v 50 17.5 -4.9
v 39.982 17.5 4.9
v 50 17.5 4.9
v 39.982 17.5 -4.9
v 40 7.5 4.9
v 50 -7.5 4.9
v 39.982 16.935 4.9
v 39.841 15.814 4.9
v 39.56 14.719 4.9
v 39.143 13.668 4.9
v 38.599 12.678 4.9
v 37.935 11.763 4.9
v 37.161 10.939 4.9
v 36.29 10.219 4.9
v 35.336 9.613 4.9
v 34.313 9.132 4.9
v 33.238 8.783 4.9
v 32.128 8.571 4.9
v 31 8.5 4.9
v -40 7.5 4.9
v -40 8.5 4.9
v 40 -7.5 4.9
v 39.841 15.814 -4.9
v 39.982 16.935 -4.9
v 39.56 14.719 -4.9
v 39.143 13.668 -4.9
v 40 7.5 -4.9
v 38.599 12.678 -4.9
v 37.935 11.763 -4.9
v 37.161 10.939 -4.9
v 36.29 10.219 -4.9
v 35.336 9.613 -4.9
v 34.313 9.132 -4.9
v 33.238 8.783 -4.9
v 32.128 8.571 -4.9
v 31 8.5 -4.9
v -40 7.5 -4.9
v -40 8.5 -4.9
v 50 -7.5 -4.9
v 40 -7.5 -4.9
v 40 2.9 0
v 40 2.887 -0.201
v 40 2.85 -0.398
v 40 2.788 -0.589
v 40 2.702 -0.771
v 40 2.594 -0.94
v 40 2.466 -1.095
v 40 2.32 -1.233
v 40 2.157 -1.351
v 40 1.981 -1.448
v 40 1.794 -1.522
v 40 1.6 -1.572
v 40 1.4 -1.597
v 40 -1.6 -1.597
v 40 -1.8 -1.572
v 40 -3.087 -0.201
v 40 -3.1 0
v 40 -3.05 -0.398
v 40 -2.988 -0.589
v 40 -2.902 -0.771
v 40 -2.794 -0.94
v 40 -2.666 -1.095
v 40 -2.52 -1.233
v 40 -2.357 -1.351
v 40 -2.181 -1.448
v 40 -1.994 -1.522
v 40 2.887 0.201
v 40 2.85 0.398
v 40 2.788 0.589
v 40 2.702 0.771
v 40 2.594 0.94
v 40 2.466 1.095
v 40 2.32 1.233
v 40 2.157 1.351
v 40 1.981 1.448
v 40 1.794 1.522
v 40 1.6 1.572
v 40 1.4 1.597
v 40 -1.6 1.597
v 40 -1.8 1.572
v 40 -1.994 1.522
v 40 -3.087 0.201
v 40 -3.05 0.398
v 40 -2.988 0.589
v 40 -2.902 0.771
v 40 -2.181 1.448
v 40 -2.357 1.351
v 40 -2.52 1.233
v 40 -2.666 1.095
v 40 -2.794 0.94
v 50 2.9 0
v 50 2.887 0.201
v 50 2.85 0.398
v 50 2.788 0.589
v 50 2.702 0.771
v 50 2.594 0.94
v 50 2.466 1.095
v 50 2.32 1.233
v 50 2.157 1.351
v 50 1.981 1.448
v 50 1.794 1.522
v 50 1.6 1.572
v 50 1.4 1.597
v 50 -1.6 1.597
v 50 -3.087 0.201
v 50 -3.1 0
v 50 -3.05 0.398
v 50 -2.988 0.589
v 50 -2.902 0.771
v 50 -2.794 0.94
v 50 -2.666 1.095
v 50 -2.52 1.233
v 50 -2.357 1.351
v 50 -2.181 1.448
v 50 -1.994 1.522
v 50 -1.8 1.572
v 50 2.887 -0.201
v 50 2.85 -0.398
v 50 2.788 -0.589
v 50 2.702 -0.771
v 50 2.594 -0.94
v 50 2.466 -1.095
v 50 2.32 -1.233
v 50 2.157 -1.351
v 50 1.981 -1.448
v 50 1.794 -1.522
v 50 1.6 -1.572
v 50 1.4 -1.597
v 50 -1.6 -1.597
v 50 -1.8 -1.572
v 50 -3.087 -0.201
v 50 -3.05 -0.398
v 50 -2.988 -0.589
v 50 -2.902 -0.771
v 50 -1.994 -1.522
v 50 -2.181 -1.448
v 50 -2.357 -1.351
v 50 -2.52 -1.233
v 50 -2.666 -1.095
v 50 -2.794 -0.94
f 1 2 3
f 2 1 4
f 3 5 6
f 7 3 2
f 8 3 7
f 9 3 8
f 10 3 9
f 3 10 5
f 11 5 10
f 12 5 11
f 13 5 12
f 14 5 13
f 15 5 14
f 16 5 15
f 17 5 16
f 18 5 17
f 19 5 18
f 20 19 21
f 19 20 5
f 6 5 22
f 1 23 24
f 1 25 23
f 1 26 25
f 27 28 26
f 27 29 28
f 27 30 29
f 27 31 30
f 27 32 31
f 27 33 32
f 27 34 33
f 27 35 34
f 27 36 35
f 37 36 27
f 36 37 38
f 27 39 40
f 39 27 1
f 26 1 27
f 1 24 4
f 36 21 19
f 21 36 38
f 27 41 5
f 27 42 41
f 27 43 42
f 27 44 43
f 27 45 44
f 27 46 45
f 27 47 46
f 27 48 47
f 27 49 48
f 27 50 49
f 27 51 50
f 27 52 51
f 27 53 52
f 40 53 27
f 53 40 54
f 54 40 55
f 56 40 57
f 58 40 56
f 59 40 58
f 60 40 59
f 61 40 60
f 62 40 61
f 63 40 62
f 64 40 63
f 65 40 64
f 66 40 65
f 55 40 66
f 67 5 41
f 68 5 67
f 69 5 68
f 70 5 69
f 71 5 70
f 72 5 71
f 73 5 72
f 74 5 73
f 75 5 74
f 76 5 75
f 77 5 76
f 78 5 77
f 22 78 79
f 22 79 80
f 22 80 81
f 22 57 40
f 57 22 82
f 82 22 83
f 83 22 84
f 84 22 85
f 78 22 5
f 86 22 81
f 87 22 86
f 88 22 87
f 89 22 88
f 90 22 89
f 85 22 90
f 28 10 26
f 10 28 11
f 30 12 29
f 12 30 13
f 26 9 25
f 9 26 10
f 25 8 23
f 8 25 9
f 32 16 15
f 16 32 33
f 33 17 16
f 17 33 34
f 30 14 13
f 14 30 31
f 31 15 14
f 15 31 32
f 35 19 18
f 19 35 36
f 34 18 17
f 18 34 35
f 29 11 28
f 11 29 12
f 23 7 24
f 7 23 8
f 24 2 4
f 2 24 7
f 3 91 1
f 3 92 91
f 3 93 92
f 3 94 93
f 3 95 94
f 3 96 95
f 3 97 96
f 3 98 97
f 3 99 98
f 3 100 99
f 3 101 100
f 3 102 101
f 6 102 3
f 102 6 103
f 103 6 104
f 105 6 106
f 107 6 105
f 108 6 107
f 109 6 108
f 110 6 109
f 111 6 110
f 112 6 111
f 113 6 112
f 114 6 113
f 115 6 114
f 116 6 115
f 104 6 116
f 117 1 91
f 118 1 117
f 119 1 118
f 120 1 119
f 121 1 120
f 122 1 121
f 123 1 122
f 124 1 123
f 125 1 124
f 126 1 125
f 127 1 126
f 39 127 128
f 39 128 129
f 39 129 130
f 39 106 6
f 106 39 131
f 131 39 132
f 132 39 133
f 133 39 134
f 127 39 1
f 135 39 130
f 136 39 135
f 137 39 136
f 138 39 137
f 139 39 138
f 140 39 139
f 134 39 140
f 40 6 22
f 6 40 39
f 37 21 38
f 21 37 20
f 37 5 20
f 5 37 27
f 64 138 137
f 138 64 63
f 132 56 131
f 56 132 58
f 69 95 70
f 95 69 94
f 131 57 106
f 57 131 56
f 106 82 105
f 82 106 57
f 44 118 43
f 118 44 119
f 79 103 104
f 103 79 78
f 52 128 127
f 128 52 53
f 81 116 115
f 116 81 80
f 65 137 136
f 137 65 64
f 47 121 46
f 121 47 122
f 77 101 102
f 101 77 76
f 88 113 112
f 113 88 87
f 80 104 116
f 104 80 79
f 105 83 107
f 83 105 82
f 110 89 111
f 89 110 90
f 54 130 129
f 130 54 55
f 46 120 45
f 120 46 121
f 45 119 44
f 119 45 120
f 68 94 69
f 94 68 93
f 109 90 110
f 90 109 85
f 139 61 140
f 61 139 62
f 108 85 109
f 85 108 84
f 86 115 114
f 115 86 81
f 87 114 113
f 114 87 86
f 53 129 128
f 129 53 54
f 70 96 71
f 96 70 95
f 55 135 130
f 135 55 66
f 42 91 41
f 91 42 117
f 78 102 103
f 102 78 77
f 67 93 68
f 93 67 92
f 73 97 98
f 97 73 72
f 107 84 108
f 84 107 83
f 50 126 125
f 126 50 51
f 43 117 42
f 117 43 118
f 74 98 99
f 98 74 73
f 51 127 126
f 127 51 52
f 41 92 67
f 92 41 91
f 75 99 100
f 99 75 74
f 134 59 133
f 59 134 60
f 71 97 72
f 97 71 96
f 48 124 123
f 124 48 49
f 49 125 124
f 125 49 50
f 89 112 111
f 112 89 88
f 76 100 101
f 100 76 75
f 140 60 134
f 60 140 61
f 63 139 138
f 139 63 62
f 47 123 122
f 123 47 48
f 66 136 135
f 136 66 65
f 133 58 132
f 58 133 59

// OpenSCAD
// file: ../UsefullBits/utilities.scad
module isoTriangle(height, base, thickness){
    linear_extrude(height=thickness, center=true)
        polygon([[base/2,0],[-base/2,0],[0,height]]);       
}
module rightTriangle(height, base, thickness, skew=0){
    //Skew moves the top corner by a fraction of the base width
    linear_extrude(height=thickness, center=true)
        polygon([[0,0],[base*skew,height],[base,0]]);
}

module lSection(baseWidth, baseThickness, sideWidth, sideThickness, length){
    linear_extrude(length)
        polygon([[0,0],[-baseWidth,0],[-baseWidth,baseThickness],[-sideThickness,baseThickness],[-sideThickness,sideWidth],[0,sideWidth]]);
}
module M3cylinder(threadLength, headLength, $fn=50){
    union(){
        translate([0,0,-threadLength+0.01])
        cylinder(d=3, h=threadLength);
        
        cylinder(d=5.5, h=headLength);
    }
}

module nut(w, height, hole){
    t6=tan(60);
    
    difference(){
        linear_extrude(height, center=true)
            polygon([[w/t6,w],[-w/t6,w],[-(((w/t6)^2+w^2)^0.5),0],[-w/t6,-w],[w/t6,-w],[(((w/t6)^2+w^2)^0.5),0]]);

        cylinder(d=hole, h=height+1, center=true, $fn=50);
    }
}

module slot(diam,length,thickness, $fn=50){
    linear_extrude(thickness)
        hull(){
            circle(d=diam);
            translate([length-diam,0,0])
                circle(d=diam);
        }
}

module roundedCorner(height, side){
    difference(){
        cube([side,side,height], center=true);
        translate([side/2,side/2,0]) cylinder(h=height+1,r=side,center=true,$fn=50);
    }   
}
// main file
use <../UsefullBits/utilities.scad>


//PARAMETERS
hingeL = 40;
lockL = 40;
blockHeight = 10;
blockDepth = 15;

grooveThickness = 2;
grooveDepth = 3;
grooves = [0,0];

clampThickness = 1;
clampHeight = blockHeight-0.2;



//block();
color("lightGreen") clamp();

module clamp(){
	difference(){
		union(){
			baseExtension = 10;
			//Left end block
			translate([hingeL+5,5,0])
				cube([10,blockDepth+baseExtension,clampHeight], center=true);
			
			//Left rounded corner
			translate([hingeL-(baseExtension-clampThickness)/2,blockDepth/2+baseExtension-(baseExtension-clampThickness)/2,0])
				rotate([0,0,90])
					roundedCorner(clampHeight, baseExtension-clampThickness);
			
			//Clamp main length
			translate([0,blockDepth/2+clampThickness/2,0])
				cube([hingeL+lockL,clampThickness,clampHeight], center=true);
			
			//Right latch pieces
			//Right end block
			//translate([-hingeL-2.5,0,0])
			//	cube([5,10,clampHeight], center=true);
		}
		translate([hingeL-1,-1.5,0])
			rotate([90,0,90])
				slot(3.2,6,20);
		
	}
}

module block(){
	difference(){
		union(){
			//Main body
			cube([hingeL+lockL, blockDepth, blockHeight], center=true);
			//Top and bottom plates
			color("orange")
			for (i=grooves){
				translate([0,grooveDepth/2,(-1+2*i)*(blockHeight/2+grooveThickness/2)])
					cube([hingeL+lockL, blockDepth+grooveDepth, grooveThickness], center=true);
			}
		}
		//V-groove cutout
		translate([0,blockDepth/2,0])
			rotate([0,0,45])
				rightTriangle(10,10,blockHeight*2);
		
		//Left bolt hole
		translate([hingeL-19,0,0])
			rotate([90,0,90])
				slot(2.8,2.8,20);
		
		//Right bolt hole
		translate([-hingeL-1,0,0])
			rotate([90,0,90])
				slot(2.8,2.8,20);
	}
}
